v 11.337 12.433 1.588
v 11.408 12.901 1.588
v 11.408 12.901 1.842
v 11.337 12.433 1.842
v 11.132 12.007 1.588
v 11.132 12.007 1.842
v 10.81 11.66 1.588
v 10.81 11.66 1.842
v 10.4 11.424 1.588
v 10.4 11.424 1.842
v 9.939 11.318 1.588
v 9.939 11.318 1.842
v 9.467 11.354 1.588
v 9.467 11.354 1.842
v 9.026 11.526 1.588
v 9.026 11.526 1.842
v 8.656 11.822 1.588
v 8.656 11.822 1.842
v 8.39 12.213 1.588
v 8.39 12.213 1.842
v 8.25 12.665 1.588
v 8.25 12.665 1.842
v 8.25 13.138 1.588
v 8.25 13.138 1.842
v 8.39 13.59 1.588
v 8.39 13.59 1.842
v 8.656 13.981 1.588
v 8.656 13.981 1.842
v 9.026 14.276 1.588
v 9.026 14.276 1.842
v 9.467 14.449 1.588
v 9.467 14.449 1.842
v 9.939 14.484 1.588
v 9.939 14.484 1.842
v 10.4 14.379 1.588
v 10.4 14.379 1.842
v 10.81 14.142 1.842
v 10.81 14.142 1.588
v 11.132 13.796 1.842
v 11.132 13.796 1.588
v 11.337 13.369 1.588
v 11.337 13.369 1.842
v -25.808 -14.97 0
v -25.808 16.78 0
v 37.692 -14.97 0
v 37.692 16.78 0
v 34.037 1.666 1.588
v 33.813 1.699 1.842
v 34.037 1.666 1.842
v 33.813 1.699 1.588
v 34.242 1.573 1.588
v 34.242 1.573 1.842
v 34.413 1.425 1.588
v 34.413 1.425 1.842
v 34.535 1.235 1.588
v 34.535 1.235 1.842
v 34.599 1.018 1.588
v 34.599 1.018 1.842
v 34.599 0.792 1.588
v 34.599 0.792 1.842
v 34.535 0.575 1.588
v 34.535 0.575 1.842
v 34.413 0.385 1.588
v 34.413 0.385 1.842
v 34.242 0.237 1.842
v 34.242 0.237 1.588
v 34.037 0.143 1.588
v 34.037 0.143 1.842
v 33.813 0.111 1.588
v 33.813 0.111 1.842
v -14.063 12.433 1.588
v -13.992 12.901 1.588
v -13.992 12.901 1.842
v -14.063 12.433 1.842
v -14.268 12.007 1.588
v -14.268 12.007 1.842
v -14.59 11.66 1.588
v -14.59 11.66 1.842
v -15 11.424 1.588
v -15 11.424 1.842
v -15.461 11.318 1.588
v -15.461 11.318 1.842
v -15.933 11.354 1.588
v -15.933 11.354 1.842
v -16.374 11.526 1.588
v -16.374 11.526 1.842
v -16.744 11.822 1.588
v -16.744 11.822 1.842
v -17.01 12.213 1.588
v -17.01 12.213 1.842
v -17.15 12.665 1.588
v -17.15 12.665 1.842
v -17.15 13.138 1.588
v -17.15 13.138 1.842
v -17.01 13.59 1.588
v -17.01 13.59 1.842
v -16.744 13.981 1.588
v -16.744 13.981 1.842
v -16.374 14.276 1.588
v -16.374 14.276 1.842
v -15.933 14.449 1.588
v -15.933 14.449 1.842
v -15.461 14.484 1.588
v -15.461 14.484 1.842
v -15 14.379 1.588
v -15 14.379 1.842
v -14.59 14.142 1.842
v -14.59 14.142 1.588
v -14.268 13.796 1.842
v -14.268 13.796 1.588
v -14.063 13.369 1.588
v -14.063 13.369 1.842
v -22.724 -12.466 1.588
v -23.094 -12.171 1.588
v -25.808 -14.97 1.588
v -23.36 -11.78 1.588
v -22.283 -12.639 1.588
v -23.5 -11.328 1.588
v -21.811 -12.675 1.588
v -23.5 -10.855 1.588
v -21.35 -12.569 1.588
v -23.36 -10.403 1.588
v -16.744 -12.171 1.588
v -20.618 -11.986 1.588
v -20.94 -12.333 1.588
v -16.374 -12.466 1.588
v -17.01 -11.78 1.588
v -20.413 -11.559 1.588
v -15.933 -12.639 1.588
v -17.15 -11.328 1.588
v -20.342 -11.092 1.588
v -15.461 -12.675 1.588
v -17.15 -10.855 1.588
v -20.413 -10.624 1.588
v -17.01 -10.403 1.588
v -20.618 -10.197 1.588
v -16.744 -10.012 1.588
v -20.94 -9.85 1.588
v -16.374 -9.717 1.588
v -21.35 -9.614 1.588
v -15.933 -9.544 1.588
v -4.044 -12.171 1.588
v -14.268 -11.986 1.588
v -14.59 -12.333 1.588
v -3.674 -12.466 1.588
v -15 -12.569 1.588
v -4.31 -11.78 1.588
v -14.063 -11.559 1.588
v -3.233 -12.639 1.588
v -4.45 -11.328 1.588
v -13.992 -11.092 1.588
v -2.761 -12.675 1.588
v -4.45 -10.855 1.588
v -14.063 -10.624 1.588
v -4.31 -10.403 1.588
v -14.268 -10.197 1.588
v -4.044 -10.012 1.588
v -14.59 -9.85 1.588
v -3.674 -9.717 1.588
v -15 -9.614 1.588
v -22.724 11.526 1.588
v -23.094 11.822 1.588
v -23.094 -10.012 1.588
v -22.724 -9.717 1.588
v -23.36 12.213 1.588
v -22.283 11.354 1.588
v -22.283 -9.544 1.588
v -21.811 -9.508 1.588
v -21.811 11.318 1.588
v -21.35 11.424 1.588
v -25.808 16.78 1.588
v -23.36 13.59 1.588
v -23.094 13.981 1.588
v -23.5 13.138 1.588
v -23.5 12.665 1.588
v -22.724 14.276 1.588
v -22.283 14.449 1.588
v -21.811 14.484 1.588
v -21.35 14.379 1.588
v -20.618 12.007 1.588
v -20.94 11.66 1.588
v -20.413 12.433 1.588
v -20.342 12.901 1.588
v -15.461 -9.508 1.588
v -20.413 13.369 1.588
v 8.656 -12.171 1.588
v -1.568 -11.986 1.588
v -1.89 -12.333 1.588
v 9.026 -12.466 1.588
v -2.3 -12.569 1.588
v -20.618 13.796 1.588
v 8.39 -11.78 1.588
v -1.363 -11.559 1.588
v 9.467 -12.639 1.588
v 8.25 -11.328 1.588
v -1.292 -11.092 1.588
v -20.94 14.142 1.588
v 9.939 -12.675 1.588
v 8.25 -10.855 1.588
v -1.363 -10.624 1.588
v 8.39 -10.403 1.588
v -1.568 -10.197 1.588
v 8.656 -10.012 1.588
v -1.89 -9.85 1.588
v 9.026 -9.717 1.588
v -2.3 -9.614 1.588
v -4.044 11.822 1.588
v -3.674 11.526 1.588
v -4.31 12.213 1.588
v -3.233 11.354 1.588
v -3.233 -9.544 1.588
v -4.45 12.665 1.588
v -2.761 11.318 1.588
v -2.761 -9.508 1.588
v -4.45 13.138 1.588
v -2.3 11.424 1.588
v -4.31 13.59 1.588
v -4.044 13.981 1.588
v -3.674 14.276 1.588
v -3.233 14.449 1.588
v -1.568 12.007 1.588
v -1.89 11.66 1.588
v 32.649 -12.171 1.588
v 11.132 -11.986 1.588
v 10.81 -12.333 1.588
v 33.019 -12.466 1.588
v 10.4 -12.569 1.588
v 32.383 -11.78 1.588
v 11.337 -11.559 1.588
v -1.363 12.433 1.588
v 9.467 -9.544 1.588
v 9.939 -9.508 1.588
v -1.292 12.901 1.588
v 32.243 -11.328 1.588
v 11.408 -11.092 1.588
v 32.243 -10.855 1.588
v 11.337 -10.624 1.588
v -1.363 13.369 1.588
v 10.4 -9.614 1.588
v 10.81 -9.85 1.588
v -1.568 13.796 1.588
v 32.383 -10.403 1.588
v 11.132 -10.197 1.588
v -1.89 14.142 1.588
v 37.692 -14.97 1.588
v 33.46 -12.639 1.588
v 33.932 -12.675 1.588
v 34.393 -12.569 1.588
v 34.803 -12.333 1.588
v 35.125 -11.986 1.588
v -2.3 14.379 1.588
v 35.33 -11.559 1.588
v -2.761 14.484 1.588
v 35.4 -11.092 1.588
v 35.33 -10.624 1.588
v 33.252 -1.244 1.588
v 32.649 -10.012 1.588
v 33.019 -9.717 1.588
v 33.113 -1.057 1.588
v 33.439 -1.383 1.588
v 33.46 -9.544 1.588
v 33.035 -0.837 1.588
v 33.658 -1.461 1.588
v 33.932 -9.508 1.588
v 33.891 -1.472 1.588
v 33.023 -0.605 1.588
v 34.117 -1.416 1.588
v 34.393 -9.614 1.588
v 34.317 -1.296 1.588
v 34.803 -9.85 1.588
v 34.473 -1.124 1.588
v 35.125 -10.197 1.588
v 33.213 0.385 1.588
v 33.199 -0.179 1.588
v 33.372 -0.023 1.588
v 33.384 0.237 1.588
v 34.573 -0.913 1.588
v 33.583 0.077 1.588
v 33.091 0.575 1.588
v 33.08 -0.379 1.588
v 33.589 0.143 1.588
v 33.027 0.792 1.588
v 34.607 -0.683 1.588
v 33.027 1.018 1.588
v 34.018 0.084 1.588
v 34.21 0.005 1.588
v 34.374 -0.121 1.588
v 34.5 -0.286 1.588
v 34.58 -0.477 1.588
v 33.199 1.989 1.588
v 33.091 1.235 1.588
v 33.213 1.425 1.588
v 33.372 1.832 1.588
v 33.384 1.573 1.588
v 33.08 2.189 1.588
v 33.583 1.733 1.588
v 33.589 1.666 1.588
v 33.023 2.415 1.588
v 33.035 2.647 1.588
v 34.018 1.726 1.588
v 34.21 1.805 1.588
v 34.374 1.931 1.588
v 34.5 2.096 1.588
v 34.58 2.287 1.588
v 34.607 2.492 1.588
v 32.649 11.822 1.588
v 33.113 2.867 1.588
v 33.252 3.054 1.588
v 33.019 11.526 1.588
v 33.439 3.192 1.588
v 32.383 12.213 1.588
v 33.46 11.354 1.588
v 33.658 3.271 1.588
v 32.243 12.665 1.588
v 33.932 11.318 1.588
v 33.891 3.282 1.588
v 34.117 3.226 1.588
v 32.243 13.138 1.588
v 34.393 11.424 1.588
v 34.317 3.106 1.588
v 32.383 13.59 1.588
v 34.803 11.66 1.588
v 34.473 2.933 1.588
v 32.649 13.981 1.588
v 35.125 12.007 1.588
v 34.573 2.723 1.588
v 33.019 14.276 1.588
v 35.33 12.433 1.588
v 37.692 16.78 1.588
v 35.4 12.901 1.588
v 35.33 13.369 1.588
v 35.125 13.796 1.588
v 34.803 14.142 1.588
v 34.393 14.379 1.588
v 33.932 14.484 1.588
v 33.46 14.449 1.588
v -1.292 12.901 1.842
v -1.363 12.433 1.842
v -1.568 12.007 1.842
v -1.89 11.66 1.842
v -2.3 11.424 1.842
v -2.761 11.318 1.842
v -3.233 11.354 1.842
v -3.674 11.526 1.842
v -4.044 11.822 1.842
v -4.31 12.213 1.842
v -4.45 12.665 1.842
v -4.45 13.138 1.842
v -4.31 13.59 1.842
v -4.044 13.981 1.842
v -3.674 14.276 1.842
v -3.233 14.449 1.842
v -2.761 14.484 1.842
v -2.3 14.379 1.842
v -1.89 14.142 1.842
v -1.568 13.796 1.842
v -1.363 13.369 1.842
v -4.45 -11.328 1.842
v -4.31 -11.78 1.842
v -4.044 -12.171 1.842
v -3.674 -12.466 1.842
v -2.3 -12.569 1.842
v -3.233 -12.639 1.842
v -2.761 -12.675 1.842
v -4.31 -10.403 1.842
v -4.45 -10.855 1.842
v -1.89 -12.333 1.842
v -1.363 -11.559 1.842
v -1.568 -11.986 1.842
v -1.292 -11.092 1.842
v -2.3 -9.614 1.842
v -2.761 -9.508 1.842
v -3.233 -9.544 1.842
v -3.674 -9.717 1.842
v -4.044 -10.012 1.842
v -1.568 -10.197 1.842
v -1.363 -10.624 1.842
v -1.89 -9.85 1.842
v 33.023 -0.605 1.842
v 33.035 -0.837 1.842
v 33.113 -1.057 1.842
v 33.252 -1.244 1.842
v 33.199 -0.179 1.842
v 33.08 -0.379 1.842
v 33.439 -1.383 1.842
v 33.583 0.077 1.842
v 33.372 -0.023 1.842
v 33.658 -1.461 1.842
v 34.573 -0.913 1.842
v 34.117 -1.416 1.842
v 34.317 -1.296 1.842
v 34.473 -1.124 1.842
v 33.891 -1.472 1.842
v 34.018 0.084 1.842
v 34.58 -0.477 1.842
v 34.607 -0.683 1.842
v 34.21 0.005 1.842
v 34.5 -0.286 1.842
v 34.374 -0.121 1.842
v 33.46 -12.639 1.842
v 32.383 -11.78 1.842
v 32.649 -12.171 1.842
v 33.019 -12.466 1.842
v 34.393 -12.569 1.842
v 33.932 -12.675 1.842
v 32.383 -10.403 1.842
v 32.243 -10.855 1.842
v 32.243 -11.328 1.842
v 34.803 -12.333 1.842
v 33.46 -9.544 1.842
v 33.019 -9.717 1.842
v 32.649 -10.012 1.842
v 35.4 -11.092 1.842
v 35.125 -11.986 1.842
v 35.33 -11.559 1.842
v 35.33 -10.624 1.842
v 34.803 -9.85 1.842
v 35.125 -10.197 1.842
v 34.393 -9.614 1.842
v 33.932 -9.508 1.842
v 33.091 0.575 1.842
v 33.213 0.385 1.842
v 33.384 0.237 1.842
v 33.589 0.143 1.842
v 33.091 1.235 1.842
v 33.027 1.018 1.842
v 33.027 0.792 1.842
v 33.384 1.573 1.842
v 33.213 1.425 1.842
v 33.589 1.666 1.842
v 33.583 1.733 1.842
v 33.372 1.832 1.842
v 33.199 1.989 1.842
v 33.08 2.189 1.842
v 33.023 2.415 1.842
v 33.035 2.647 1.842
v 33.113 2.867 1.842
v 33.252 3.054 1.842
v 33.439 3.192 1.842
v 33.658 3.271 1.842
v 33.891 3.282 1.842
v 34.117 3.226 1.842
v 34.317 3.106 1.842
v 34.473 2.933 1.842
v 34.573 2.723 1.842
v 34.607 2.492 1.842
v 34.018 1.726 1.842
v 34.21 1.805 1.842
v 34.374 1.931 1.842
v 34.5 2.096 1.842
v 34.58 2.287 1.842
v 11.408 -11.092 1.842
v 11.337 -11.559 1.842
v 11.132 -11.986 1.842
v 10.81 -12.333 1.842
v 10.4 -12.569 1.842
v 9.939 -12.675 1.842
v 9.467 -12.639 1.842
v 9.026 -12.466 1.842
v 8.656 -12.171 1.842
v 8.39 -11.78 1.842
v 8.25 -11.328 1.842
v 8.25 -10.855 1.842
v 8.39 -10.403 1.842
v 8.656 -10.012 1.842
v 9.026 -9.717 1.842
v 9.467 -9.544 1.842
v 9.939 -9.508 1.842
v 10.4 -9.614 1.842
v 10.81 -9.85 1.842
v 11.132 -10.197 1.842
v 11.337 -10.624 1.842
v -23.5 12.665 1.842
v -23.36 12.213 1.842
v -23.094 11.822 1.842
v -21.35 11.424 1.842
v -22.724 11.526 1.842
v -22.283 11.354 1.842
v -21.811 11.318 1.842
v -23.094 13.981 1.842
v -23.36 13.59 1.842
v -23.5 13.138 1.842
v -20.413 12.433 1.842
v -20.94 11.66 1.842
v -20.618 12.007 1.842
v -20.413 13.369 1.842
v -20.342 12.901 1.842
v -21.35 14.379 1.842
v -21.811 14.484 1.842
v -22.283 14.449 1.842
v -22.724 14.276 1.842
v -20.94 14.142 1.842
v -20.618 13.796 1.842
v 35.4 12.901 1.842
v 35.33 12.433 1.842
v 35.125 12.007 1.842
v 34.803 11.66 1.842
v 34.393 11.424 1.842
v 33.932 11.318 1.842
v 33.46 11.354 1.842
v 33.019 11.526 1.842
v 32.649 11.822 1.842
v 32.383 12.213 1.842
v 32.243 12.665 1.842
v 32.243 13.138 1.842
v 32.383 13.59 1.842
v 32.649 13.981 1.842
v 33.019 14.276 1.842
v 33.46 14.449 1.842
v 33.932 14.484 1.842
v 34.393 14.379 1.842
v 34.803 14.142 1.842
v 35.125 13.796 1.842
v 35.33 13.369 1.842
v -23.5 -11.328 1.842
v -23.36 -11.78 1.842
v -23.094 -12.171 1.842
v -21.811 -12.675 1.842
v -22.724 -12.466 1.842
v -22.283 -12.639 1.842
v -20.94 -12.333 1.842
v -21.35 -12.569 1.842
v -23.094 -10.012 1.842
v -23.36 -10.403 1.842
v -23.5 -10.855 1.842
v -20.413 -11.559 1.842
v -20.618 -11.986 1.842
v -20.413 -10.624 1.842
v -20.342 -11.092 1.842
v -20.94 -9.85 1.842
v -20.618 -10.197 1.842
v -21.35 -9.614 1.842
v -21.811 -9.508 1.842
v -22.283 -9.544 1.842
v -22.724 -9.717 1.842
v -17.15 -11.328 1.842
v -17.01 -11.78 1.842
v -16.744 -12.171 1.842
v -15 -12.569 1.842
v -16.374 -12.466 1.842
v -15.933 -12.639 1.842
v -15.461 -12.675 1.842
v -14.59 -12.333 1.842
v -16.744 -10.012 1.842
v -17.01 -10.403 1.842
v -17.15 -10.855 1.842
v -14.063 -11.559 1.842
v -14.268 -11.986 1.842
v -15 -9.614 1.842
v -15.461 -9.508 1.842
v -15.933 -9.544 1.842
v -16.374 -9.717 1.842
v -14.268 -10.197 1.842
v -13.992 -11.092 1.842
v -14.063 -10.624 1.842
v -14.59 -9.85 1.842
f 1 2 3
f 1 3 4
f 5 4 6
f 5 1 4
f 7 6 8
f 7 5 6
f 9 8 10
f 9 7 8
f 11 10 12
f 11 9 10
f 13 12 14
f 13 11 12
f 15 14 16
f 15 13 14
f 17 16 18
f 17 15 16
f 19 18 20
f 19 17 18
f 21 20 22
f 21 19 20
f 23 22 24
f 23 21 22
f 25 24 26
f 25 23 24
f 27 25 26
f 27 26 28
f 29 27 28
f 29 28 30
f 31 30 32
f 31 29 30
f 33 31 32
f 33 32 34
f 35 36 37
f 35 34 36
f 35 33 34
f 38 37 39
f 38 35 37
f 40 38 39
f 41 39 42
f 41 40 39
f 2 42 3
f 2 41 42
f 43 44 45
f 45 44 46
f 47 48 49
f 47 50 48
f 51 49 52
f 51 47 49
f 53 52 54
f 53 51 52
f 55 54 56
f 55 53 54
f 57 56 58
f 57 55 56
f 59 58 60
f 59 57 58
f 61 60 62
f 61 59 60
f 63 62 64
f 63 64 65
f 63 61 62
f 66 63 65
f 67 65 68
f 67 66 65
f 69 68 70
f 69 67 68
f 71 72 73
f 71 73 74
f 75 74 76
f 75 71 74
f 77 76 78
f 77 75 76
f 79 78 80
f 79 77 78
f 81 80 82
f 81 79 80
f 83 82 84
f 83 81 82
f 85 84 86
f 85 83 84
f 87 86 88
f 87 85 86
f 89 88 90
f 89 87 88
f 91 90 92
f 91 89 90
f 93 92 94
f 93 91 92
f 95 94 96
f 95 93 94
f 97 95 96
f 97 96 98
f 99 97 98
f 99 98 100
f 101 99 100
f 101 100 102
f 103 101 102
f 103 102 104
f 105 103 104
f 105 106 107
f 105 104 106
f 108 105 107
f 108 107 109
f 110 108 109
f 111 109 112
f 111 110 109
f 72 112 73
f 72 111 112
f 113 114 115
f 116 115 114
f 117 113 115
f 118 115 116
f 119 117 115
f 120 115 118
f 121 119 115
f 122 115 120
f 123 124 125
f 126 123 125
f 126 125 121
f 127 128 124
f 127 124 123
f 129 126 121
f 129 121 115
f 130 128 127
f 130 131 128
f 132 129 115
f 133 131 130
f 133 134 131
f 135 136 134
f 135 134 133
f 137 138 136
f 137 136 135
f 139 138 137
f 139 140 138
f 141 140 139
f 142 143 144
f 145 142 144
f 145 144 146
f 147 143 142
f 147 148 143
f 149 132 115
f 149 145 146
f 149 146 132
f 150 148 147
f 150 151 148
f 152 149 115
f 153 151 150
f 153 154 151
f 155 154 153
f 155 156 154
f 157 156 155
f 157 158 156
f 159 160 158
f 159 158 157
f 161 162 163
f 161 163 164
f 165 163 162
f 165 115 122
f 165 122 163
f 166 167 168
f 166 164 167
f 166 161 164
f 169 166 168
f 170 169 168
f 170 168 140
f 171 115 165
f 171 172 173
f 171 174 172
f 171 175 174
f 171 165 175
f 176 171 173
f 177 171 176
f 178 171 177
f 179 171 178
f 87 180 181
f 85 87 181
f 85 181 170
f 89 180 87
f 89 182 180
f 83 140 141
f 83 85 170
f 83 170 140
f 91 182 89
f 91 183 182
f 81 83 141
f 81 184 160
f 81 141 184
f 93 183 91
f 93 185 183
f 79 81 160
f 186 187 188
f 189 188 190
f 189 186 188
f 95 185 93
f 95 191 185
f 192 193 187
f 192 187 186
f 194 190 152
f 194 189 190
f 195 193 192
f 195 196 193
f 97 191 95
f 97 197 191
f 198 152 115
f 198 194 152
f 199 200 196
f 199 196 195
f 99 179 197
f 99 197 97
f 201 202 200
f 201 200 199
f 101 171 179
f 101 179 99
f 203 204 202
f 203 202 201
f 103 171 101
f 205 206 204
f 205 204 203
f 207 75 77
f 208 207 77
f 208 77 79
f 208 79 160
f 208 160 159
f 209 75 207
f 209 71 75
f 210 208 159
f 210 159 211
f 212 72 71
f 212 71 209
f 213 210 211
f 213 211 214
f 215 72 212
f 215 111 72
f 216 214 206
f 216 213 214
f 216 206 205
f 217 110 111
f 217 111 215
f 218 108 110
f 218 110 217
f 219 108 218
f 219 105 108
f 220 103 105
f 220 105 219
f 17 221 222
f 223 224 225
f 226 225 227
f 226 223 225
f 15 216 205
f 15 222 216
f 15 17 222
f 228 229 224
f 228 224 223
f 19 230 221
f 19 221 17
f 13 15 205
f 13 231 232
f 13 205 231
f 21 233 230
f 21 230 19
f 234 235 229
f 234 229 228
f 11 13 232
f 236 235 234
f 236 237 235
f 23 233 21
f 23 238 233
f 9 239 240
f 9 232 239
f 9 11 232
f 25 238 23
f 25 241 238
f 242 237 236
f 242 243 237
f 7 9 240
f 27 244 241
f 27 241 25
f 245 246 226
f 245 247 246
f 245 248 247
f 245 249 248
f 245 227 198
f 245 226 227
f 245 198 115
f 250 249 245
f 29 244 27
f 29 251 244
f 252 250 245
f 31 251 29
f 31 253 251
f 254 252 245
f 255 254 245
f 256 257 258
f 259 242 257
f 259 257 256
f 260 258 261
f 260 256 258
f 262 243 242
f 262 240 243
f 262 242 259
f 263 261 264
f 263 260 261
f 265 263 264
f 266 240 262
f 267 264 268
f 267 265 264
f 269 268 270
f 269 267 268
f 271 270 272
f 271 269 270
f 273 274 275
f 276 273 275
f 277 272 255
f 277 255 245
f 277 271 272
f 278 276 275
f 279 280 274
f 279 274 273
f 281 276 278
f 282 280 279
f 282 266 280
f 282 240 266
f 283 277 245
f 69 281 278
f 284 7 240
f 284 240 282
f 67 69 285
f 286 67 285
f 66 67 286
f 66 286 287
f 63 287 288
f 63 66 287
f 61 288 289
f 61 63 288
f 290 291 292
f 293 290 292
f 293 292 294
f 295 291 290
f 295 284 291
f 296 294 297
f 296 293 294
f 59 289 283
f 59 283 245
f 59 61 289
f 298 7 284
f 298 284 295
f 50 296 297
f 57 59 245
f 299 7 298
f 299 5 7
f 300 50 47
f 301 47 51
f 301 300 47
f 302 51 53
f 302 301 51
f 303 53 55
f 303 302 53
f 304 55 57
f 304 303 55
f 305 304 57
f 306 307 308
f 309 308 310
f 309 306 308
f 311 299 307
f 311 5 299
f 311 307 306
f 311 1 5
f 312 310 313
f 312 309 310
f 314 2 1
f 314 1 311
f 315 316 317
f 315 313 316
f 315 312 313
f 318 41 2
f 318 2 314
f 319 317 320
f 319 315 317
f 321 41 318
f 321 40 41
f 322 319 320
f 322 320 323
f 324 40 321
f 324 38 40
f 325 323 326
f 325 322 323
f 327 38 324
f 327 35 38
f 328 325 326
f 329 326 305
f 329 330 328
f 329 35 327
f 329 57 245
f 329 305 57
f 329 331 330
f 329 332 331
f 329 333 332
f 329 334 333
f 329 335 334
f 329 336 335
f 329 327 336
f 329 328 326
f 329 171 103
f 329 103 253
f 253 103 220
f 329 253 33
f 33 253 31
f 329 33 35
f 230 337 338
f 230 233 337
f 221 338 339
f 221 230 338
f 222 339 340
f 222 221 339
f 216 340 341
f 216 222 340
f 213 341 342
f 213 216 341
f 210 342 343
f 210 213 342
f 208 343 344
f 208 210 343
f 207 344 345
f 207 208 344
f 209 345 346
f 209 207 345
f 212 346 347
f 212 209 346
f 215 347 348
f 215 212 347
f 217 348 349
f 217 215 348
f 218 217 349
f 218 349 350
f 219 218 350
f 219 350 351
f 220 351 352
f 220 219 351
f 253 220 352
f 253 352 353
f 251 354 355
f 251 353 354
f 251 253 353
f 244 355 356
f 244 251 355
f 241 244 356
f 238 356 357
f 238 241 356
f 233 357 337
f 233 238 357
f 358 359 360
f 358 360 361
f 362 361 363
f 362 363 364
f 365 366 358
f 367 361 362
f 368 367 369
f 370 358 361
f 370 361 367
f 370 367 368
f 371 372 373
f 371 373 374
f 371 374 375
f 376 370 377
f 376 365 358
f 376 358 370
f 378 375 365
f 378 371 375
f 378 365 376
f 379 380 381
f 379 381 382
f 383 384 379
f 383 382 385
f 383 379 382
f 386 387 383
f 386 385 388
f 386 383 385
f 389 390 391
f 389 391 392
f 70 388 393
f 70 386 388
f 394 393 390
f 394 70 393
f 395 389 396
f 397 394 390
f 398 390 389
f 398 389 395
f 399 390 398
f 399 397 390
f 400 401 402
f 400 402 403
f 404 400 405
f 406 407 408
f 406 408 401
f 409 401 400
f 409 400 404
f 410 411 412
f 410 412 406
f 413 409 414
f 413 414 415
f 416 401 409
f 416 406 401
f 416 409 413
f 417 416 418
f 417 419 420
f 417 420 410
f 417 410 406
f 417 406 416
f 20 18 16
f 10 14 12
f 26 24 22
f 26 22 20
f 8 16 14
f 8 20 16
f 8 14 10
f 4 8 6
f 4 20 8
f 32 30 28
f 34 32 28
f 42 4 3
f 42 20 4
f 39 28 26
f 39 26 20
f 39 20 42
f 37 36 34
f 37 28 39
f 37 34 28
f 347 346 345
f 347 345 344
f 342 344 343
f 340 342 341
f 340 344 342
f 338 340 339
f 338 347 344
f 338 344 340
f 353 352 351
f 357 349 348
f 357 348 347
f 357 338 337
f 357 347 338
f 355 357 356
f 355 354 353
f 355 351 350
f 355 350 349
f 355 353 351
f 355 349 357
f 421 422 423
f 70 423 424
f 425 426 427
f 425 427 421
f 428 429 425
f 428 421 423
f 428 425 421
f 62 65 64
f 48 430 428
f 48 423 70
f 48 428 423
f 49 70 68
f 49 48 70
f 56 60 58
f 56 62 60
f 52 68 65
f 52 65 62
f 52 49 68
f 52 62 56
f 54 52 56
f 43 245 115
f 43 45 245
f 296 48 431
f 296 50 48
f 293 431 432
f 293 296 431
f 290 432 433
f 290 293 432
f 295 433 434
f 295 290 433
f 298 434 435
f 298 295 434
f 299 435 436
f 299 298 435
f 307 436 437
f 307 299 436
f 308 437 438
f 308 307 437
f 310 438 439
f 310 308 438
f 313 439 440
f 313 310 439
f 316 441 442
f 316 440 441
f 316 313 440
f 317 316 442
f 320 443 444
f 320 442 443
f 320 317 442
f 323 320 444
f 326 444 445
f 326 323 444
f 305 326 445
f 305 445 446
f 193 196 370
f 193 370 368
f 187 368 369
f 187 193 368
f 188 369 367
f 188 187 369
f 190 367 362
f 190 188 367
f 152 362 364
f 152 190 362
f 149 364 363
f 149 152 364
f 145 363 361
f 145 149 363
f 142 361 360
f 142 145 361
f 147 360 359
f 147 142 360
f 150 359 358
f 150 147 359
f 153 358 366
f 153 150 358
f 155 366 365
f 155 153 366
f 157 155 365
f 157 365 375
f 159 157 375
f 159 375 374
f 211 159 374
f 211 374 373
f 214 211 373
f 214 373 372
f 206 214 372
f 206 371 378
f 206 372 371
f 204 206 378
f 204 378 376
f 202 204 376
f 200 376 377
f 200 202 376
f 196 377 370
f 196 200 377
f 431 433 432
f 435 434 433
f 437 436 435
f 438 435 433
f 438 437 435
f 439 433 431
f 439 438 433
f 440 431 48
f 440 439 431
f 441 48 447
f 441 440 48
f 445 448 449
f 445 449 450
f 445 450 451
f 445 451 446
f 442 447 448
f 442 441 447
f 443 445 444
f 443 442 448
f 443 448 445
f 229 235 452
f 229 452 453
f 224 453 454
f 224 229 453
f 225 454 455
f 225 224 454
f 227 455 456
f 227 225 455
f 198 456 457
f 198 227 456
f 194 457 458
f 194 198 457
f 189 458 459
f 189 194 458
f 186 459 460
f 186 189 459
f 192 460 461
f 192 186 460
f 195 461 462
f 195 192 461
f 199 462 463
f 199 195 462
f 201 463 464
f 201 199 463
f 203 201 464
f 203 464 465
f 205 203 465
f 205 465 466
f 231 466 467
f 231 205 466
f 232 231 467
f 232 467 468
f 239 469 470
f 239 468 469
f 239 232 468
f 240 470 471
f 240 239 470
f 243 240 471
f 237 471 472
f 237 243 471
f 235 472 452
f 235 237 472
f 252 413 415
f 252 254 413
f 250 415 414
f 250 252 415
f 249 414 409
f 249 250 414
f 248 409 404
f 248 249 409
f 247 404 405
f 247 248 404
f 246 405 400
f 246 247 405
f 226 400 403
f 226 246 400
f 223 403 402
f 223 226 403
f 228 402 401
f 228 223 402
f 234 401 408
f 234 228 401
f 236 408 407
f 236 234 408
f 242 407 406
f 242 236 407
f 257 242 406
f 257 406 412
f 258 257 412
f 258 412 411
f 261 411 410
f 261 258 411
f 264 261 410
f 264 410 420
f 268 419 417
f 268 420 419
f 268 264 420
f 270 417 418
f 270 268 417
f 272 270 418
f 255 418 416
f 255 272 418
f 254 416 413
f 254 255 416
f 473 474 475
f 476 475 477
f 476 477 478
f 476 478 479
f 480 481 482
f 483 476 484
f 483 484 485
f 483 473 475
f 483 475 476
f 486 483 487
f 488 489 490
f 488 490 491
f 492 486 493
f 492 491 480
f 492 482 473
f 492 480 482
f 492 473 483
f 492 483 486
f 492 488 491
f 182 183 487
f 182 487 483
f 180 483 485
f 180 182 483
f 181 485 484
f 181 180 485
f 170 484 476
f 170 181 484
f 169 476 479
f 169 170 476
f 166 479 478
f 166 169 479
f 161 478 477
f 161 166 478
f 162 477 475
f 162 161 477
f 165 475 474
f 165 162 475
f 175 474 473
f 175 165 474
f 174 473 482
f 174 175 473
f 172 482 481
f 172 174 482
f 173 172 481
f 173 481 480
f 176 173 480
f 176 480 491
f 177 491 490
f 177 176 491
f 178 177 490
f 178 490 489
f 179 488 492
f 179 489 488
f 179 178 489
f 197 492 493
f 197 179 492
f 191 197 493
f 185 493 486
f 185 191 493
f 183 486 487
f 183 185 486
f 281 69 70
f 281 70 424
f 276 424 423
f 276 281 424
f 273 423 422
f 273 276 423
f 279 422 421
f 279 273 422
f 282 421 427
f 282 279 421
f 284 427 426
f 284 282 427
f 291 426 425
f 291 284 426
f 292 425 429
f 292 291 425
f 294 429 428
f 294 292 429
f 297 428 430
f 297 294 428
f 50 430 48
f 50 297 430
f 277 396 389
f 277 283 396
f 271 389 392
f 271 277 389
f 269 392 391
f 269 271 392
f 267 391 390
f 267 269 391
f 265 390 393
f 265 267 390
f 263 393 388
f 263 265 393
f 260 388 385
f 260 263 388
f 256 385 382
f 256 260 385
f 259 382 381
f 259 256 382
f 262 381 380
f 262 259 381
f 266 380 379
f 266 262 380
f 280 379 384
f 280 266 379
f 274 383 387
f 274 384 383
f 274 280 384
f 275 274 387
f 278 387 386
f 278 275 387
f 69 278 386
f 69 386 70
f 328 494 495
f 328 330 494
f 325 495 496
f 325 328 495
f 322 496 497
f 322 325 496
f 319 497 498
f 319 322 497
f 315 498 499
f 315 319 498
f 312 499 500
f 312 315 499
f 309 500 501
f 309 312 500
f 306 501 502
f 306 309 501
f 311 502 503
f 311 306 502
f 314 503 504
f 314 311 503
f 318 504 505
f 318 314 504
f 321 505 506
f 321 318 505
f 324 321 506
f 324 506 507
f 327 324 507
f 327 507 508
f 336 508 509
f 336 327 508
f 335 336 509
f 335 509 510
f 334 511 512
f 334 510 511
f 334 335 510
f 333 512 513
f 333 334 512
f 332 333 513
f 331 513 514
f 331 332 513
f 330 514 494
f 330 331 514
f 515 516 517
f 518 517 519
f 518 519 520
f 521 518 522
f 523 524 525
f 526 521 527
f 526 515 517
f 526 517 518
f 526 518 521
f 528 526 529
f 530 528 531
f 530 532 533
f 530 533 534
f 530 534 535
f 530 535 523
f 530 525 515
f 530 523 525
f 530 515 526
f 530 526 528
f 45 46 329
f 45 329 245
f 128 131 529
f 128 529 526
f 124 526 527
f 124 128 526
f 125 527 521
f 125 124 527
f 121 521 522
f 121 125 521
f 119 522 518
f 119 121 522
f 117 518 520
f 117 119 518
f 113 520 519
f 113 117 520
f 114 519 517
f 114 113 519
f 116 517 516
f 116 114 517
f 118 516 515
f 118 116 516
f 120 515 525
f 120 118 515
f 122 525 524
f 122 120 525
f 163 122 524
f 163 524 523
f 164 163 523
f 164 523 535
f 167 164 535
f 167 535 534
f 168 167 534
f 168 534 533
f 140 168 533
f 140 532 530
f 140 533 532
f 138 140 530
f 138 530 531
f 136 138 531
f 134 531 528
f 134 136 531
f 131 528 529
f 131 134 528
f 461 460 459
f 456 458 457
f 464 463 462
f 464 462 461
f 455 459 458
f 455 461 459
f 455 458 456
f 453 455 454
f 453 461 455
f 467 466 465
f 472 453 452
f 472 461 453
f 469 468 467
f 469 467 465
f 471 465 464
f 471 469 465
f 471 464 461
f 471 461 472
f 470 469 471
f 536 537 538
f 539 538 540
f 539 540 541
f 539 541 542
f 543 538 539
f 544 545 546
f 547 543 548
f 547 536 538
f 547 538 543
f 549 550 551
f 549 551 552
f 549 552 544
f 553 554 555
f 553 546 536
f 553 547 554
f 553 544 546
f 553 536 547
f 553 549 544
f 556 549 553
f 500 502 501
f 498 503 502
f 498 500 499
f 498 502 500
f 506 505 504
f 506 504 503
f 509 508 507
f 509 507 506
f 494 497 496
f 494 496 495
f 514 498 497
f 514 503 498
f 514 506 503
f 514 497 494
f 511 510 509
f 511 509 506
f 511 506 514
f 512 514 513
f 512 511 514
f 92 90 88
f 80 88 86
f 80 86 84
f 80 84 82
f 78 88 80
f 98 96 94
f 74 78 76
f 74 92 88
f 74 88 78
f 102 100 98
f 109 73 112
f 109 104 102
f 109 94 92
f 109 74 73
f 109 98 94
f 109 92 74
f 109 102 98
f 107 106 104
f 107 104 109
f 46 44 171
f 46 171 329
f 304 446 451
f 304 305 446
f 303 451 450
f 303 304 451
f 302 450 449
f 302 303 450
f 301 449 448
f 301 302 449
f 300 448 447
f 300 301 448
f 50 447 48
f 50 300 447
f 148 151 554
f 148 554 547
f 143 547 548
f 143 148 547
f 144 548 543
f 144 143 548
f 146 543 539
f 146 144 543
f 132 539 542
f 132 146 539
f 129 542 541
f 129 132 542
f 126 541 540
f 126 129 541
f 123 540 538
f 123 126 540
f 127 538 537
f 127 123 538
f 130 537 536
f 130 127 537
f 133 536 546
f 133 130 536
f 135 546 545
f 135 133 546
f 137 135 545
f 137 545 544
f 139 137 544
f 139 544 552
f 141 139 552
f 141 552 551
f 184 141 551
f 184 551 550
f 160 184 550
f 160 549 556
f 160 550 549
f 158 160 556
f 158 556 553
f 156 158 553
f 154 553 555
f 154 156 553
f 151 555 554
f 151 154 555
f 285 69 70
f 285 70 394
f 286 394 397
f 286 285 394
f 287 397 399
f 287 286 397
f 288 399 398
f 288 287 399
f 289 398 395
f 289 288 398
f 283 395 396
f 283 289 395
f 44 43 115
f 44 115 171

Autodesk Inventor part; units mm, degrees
ref_plane "YZ Plane" through (0, 0, 0) normal (1, 0, 0) x (0, 1, 0)
ref_plane "XZ Plane" through (0, 0, 0) normal (0, 1, 0) x (-1, 0, 0)
ref_plane "XY Plane" through (0, 0, 0) normal (0, 0, 1) x (1, 0, 0)
sketch "Sketch1" plane through (0, 0, 0) normal (0, 0, 1) x (1, 0, 0)
  line L0 (-25.8084, 16.7799) -> (37.6916, 16.7799)
  line L1 (37.6916, 16.7799) -> (37.6916, -14.9701)
  line L2 (37.6916, -14.9701) -> (-25.8084, -14.9701)
  line L3 (-25.8084, -14.9701) -> (-25.8084, 16.7799)
  point P0 (0, 0)
  dimension "d0" = 31.75
  dimension "d1" = 63.5
extrude "Extrusion1" add sketch "Sketch1" along normal blind 1.5875
sketch "Sketch2" plane through (0, 0, 1.5875) normal (0, 0, 1) x (1, 0, 0)
  line L0 (37.6916, 16.7799) -> (37.6916, -14.9701) projected
  line L1 (-25.8084, 16.7799) -> (37.6916, 16.7799) projected
  line L2 (-25.8084, -14.9701) -> (-25.8084, 16.7799) projected
  line L3 (37.6916, -14.9701) -> (-25.8084, -14.9701) projected
  circle A0 centre (33.813, 12.9013) radius 1.5875
  circle A1 centre (33.813, -11.0915) radius 1.5875
  circle A2 centre (33.813, 2.4924) radius 0.7937
  circle A3 centre (33.813, 0.9049) radius 0.7937
  circle A4 centre (33.813, -0.6826) radius 0.7937
  line L4 (33.813, -14.9701) -> (33.813, 16.7799) construction
  line L5 (33.813, 2.4924) -> (33.813, 0.9049) construction
  line L6 (33.813, 0.9049) -> (33.813, -0.6826) construction
  line L7 (33.813, 12.9013) -> (33.813, 2.4924) construction
  line L8 (33.813, -11.0915) -> (33.813, -0.6826) construction
  circle A5 centre (-21.9298, 12.9013) radius 1.5875
  circle A6 centre (-21.9298, -11.0915) radius 1.5875
  line L9 (-21.9298, 16.7799) -> (-21.9298, -14.9701) construction
  line L10 (-25.8084, -11.0915) -> (37.6916, -11.0915) construction
  circle A7 centre (-15.5798, 12.9013) radius 1.5875
  circle A8 centre (-15.5798, -11.0915) radius 1.5875
  circle A9 centre (-2.8798, 12.9013) radius 1.5875
  circle A10 centre (-2.8798, -11.0915) radius 1.5875
  circle A11 centre (9.8202, 12.9013) radius 1.5875
  circle A12 centre (9.8202, -11.0915) radius 1.5875
  point P0 (0, 0)
  dimension "d4" = 3.8786
  dimension "d5" = 3.8786
  dimension "d6" = 3.8786
  dimension "d7" = 3.175
  dimension "d8" = 1.5875
  dimension "d9" = 3.175
  dimension "d10" = 3.8786
  dimension "d11" = 3.8786
  dimension "d14" = 6.35
  dimension "d21" = 12.7
  dimension "d28" = 12.7
extrude "Extrusion2" add sketch "Sketch2" along normal blind 0.254 contours A0 | A1 | A2 | A4 | A3 | A5 | A6 | A7 | A8 | A9 | A10 | A11 | A12
sketch "Sketch3" plane through (33.813, 12.9013, 1.8415) normal (0, 0, 1) x (1, 0, 0)
  circle A0 centre (0, 0) radius 1.5875 construction
sketch "Sketch4" plane through (33.813, -11.0915, 1.8415) normal (0, 0, 1) x (1, 0, 0)
  circle A0 centre (0, 0) radius 1.5875 construction
sketch "Sketch5" plane through (9.8202, 12.9013, 1.8415) normal (0, 0, 1) x (1, 0, 0)
  circle A0 centre (0, 0) radius 1.5875 construction
sketch "Sketch6" plane through (9.8202, -11.0915, 1.8415) normal (0, 0, 1) x (1, 0, 0)
  circle A0 centre (0, 0) radius 1.5875 construction
sketch "Sketch7" plane through (-2.8798, 12.9013, 1.8415) normal (0, 0, 1) x (1, 0, 0)
  circle A0 centre (0, 0) radius 1.5875 construction
sketch "Sketch8" plane through (-2.8798, -11.0915, 1.8415) normal (0, 0, 1) x (1, 0, 0)
  circle A0 centre (0, 0) radius 1.5875 construction
sketch "Sketch9" plane through (-15.5798, 12.9013, 1.8415) normal (0, 0, 1) x (1, 0, 0)
  circle A0 centre (0, 0) radius 1.5875 construction
sketch "Sketch10" plane through (-15.5798, -11.0915, 1.8415) normal (0, 0, 1) x (1, 0, 0)
  circle A0 centre (0, 0) radius 1.5875 construction
sketch "Sketch11" plane through (-21.9298, 12.9013, 1.8415) normal (0, 0, 1) x (1, 0, 0)
  circle A0 centre (0, 0) radius 1.5875 construction
sketch "Sketch12" plane through (-21.9298, -11.0915, 1.8415) normal (0, 0, 1) x (1, 0, 0)
  circle A0 centre (0, 0) radius 1.5875 construction
sketch "Sketch13" plane through (33.813, -0.6826, 1.8415) normal (0, 0, 1) x (1, 0, 0)
  circle A0 centre (0, 0) radius 0.7937 construction
  point P0 (0, 0.7937)
sketch "Sketch14" plane through (0, 0, 1.8415) normal (0, 0, 1) x (1, 0, 0)
  arc A0 (33.813, 0.1112) -> (33.813, 1.6987) centre (33.813, 0.9049) ccw construction
sketch "Sketch15" plane through (33.813, 2.4924, 1.8415) normal (0, 0, 1) x (1, 0, 0)
  circle A0 centre (0, 0) radius 0.7937 construction
  point P0 (0, -0.7937)
equation "\"d5\" = d4"
equation "\"d6\" = d4"
equation "\"d10\" = d4"
equation "\"d11\" = d4"
properties part number "PDU"
